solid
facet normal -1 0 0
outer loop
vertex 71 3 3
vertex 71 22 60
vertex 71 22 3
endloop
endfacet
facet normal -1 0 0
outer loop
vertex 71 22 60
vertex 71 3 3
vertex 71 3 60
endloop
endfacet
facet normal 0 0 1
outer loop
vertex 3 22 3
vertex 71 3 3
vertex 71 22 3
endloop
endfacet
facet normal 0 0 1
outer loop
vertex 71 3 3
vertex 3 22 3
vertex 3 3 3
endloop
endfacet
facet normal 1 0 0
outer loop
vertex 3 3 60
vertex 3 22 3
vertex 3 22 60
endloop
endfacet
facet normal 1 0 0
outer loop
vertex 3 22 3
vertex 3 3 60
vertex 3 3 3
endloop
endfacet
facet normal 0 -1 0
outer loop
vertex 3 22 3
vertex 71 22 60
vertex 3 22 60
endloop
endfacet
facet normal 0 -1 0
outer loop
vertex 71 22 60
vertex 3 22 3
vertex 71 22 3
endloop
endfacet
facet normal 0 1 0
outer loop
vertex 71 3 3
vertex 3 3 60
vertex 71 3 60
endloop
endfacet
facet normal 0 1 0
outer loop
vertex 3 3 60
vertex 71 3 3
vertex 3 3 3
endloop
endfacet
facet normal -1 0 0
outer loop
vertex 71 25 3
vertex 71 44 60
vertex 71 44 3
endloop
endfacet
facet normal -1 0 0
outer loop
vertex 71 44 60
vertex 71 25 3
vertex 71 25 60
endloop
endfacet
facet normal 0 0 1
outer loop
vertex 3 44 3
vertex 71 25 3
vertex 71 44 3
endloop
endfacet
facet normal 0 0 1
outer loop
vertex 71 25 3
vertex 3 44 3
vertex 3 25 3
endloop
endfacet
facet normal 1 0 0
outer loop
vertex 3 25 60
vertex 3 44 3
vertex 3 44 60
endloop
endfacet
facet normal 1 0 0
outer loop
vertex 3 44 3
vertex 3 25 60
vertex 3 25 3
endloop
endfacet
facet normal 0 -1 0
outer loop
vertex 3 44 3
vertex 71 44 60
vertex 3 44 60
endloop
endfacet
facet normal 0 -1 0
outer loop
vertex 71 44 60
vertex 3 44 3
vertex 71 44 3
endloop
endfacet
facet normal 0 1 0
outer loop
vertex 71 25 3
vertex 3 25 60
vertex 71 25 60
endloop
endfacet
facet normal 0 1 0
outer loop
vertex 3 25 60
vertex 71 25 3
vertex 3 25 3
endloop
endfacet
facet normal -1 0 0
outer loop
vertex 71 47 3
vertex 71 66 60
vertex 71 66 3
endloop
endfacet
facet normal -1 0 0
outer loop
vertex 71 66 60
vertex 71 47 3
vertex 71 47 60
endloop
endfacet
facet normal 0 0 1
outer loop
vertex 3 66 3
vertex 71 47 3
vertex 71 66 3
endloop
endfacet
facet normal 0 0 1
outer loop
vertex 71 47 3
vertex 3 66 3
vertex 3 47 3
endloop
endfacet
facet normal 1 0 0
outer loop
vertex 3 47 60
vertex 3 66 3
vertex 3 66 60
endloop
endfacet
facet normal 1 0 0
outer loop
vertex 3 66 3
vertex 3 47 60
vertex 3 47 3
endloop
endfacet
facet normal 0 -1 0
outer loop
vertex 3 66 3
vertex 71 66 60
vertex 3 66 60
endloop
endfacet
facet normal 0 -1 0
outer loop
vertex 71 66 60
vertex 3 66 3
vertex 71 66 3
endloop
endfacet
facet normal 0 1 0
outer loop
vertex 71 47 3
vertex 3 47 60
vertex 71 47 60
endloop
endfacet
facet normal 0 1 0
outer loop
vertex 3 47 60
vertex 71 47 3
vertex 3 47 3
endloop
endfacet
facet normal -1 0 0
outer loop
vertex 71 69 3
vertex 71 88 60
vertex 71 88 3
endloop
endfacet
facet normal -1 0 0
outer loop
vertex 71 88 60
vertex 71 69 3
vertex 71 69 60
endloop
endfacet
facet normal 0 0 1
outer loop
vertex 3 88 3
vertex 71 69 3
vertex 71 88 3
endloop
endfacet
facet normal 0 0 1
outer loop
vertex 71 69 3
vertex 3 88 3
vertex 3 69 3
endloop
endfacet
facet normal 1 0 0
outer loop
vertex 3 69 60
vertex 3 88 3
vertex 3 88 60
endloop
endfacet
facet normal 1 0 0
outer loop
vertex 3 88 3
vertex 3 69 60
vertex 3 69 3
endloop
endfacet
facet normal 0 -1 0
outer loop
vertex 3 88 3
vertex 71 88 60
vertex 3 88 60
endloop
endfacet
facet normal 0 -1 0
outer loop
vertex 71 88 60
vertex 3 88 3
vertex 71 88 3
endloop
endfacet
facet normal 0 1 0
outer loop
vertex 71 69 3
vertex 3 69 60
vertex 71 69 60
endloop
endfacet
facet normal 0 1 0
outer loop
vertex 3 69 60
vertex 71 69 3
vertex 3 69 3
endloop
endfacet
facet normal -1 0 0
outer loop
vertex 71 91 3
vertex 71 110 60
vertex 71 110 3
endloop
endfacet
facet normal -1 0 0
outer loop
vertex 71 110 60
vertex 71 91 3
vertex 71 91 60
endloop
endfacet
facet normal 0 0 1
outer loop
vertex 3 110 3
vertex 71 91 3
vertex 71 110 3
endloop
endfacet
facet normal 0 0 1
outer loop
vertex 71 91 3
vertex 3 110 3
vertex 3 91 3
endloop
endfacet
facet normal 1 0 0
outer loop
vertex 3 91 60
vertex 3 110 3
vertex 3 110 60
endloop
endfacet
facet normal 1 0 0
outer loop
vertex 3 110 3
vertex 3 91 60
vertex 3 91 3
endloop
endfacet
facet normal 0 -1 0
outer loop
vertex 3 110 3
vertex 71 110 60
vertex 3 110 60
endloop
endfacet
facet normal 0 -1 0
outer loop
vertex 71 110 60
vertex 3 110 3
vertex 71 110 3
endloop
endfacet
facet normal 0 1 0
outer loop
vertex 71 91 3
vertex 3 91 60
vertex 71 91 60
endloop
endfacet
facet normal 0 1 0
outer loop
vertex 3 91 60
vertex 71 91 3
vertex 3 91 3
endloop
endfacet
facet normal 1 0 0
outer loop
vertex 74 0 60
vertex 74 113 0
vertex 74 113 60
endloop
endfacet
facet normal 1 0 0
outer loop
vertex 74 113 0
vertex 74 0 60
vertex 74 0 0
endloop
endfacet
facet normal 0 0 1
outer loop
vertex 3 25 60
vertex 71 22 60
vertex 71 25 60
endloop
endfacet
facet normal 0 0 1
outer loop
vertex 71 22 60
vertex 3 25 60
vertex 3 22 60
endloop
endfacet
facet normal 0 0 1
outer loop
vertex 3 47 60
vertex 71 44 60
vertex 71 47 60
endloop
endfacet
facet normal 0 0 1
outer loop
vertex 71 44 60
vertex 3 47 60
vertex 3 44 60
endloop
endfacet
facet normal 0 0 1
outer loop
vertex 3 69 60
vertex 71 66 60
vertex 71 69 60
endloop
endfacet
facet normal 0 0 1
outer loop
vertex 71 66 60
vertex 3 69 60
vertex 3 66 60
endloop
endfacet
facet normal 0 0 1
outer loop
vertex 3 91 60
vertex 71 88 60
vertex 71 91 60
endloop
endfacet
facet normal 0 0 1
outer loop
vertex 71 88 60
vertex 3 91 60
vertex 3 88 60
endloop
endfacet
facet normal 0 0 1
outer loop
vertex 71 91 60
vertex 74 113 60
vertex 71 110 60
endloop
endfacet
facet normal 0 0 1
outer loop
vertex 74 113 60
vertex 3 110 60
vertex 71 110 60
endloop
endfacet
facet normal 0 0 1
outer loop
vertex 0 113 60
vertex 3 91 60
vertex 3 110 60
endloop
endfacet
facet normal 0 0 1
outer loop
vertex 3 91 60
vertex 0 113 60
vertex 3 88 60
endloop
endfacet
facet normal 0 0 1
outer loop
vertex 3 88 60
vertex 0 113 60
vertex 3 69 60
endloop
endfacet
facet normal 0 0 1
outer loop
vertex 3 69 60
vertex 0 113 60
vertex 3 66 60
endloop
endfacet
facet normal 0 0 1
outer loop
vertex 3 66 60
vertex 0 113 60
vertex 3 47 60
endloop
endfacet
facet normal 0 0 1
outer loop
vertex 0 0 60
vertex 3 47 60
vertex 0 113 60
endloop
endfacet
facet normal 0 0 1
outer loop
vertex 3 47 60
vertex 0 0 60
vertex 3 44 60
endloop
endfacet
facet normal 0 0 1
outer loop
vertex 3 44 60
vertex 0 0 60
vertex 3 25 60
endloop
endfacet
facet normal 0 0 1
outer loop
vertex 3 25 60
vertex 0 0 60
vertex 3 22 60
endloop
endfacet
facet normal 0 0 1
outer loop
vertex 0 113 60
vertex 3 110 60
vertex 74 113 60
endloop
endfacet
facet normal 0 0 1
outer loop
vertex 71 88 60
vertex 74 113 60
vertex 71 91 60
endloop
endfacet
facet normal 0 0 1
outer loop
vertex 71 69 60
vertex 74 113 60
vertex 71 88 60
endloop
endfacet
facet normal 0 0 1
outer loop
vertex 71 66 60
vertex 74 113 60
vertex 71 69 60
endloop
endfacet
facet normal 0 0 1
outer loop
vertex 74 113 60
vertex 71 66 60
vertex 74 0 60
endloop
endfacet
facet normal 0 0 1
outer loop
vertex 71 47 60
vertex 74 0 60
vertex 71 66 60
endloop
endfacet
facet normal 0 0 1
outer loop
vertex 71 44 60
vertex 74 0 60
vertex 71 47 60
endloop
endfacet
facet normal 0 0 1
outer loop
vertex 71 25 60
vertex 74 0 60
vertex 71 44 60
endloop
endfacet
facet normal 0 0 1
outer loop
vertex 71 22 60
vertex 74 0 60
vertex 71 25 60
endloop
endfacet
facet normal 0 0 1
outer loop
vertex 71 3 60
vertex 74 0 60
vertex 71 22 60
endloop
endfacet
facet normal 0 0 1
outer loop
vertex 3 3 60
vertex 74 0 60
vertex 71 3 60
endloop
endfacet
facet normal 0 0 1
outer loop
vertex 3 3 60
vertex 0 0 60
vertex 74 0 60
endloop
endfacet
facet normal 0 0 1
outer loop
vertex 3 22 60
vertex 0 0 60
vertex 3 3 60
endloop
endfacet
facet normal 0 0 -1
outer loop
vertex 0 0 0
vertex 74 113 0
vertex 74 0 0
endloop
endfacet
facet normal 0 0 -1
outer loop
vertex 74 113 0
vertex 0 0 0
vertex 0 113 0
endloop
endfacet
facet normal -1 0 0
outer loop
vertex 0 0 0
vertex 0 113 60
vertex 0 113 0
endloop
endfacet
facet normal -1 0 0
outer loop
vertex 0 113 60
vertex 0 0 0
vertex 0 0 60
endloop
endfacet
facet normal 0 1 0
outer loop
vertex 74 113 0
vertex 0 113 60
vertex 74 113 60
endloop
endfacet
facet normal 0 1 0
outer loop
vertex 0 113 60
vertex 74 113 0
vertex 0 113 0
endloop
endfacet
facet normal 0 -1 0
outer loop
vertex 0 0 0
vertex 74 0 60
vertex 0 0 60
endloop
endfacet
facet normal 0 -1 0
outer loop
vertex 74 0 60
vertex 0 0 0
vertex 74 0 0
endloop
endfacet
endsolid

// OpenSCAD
 decks = 5;
 thickness = 3;
 deck_size = [68,19,60];
 
 difference() {
     cube([(deck_size[0]+(2*thickness)),
           (deck_size[1] * decks) + ((thickness * (decks + 1))),
           deck_size[2]]);
     
     for(i = [0 : decks - 1]) {
       translate([thickness,
                 ((thickness+deck_size[1]) * i + thickness),
                 thickness]) {
         cube(deck_size);
       }
     }
 }
 
